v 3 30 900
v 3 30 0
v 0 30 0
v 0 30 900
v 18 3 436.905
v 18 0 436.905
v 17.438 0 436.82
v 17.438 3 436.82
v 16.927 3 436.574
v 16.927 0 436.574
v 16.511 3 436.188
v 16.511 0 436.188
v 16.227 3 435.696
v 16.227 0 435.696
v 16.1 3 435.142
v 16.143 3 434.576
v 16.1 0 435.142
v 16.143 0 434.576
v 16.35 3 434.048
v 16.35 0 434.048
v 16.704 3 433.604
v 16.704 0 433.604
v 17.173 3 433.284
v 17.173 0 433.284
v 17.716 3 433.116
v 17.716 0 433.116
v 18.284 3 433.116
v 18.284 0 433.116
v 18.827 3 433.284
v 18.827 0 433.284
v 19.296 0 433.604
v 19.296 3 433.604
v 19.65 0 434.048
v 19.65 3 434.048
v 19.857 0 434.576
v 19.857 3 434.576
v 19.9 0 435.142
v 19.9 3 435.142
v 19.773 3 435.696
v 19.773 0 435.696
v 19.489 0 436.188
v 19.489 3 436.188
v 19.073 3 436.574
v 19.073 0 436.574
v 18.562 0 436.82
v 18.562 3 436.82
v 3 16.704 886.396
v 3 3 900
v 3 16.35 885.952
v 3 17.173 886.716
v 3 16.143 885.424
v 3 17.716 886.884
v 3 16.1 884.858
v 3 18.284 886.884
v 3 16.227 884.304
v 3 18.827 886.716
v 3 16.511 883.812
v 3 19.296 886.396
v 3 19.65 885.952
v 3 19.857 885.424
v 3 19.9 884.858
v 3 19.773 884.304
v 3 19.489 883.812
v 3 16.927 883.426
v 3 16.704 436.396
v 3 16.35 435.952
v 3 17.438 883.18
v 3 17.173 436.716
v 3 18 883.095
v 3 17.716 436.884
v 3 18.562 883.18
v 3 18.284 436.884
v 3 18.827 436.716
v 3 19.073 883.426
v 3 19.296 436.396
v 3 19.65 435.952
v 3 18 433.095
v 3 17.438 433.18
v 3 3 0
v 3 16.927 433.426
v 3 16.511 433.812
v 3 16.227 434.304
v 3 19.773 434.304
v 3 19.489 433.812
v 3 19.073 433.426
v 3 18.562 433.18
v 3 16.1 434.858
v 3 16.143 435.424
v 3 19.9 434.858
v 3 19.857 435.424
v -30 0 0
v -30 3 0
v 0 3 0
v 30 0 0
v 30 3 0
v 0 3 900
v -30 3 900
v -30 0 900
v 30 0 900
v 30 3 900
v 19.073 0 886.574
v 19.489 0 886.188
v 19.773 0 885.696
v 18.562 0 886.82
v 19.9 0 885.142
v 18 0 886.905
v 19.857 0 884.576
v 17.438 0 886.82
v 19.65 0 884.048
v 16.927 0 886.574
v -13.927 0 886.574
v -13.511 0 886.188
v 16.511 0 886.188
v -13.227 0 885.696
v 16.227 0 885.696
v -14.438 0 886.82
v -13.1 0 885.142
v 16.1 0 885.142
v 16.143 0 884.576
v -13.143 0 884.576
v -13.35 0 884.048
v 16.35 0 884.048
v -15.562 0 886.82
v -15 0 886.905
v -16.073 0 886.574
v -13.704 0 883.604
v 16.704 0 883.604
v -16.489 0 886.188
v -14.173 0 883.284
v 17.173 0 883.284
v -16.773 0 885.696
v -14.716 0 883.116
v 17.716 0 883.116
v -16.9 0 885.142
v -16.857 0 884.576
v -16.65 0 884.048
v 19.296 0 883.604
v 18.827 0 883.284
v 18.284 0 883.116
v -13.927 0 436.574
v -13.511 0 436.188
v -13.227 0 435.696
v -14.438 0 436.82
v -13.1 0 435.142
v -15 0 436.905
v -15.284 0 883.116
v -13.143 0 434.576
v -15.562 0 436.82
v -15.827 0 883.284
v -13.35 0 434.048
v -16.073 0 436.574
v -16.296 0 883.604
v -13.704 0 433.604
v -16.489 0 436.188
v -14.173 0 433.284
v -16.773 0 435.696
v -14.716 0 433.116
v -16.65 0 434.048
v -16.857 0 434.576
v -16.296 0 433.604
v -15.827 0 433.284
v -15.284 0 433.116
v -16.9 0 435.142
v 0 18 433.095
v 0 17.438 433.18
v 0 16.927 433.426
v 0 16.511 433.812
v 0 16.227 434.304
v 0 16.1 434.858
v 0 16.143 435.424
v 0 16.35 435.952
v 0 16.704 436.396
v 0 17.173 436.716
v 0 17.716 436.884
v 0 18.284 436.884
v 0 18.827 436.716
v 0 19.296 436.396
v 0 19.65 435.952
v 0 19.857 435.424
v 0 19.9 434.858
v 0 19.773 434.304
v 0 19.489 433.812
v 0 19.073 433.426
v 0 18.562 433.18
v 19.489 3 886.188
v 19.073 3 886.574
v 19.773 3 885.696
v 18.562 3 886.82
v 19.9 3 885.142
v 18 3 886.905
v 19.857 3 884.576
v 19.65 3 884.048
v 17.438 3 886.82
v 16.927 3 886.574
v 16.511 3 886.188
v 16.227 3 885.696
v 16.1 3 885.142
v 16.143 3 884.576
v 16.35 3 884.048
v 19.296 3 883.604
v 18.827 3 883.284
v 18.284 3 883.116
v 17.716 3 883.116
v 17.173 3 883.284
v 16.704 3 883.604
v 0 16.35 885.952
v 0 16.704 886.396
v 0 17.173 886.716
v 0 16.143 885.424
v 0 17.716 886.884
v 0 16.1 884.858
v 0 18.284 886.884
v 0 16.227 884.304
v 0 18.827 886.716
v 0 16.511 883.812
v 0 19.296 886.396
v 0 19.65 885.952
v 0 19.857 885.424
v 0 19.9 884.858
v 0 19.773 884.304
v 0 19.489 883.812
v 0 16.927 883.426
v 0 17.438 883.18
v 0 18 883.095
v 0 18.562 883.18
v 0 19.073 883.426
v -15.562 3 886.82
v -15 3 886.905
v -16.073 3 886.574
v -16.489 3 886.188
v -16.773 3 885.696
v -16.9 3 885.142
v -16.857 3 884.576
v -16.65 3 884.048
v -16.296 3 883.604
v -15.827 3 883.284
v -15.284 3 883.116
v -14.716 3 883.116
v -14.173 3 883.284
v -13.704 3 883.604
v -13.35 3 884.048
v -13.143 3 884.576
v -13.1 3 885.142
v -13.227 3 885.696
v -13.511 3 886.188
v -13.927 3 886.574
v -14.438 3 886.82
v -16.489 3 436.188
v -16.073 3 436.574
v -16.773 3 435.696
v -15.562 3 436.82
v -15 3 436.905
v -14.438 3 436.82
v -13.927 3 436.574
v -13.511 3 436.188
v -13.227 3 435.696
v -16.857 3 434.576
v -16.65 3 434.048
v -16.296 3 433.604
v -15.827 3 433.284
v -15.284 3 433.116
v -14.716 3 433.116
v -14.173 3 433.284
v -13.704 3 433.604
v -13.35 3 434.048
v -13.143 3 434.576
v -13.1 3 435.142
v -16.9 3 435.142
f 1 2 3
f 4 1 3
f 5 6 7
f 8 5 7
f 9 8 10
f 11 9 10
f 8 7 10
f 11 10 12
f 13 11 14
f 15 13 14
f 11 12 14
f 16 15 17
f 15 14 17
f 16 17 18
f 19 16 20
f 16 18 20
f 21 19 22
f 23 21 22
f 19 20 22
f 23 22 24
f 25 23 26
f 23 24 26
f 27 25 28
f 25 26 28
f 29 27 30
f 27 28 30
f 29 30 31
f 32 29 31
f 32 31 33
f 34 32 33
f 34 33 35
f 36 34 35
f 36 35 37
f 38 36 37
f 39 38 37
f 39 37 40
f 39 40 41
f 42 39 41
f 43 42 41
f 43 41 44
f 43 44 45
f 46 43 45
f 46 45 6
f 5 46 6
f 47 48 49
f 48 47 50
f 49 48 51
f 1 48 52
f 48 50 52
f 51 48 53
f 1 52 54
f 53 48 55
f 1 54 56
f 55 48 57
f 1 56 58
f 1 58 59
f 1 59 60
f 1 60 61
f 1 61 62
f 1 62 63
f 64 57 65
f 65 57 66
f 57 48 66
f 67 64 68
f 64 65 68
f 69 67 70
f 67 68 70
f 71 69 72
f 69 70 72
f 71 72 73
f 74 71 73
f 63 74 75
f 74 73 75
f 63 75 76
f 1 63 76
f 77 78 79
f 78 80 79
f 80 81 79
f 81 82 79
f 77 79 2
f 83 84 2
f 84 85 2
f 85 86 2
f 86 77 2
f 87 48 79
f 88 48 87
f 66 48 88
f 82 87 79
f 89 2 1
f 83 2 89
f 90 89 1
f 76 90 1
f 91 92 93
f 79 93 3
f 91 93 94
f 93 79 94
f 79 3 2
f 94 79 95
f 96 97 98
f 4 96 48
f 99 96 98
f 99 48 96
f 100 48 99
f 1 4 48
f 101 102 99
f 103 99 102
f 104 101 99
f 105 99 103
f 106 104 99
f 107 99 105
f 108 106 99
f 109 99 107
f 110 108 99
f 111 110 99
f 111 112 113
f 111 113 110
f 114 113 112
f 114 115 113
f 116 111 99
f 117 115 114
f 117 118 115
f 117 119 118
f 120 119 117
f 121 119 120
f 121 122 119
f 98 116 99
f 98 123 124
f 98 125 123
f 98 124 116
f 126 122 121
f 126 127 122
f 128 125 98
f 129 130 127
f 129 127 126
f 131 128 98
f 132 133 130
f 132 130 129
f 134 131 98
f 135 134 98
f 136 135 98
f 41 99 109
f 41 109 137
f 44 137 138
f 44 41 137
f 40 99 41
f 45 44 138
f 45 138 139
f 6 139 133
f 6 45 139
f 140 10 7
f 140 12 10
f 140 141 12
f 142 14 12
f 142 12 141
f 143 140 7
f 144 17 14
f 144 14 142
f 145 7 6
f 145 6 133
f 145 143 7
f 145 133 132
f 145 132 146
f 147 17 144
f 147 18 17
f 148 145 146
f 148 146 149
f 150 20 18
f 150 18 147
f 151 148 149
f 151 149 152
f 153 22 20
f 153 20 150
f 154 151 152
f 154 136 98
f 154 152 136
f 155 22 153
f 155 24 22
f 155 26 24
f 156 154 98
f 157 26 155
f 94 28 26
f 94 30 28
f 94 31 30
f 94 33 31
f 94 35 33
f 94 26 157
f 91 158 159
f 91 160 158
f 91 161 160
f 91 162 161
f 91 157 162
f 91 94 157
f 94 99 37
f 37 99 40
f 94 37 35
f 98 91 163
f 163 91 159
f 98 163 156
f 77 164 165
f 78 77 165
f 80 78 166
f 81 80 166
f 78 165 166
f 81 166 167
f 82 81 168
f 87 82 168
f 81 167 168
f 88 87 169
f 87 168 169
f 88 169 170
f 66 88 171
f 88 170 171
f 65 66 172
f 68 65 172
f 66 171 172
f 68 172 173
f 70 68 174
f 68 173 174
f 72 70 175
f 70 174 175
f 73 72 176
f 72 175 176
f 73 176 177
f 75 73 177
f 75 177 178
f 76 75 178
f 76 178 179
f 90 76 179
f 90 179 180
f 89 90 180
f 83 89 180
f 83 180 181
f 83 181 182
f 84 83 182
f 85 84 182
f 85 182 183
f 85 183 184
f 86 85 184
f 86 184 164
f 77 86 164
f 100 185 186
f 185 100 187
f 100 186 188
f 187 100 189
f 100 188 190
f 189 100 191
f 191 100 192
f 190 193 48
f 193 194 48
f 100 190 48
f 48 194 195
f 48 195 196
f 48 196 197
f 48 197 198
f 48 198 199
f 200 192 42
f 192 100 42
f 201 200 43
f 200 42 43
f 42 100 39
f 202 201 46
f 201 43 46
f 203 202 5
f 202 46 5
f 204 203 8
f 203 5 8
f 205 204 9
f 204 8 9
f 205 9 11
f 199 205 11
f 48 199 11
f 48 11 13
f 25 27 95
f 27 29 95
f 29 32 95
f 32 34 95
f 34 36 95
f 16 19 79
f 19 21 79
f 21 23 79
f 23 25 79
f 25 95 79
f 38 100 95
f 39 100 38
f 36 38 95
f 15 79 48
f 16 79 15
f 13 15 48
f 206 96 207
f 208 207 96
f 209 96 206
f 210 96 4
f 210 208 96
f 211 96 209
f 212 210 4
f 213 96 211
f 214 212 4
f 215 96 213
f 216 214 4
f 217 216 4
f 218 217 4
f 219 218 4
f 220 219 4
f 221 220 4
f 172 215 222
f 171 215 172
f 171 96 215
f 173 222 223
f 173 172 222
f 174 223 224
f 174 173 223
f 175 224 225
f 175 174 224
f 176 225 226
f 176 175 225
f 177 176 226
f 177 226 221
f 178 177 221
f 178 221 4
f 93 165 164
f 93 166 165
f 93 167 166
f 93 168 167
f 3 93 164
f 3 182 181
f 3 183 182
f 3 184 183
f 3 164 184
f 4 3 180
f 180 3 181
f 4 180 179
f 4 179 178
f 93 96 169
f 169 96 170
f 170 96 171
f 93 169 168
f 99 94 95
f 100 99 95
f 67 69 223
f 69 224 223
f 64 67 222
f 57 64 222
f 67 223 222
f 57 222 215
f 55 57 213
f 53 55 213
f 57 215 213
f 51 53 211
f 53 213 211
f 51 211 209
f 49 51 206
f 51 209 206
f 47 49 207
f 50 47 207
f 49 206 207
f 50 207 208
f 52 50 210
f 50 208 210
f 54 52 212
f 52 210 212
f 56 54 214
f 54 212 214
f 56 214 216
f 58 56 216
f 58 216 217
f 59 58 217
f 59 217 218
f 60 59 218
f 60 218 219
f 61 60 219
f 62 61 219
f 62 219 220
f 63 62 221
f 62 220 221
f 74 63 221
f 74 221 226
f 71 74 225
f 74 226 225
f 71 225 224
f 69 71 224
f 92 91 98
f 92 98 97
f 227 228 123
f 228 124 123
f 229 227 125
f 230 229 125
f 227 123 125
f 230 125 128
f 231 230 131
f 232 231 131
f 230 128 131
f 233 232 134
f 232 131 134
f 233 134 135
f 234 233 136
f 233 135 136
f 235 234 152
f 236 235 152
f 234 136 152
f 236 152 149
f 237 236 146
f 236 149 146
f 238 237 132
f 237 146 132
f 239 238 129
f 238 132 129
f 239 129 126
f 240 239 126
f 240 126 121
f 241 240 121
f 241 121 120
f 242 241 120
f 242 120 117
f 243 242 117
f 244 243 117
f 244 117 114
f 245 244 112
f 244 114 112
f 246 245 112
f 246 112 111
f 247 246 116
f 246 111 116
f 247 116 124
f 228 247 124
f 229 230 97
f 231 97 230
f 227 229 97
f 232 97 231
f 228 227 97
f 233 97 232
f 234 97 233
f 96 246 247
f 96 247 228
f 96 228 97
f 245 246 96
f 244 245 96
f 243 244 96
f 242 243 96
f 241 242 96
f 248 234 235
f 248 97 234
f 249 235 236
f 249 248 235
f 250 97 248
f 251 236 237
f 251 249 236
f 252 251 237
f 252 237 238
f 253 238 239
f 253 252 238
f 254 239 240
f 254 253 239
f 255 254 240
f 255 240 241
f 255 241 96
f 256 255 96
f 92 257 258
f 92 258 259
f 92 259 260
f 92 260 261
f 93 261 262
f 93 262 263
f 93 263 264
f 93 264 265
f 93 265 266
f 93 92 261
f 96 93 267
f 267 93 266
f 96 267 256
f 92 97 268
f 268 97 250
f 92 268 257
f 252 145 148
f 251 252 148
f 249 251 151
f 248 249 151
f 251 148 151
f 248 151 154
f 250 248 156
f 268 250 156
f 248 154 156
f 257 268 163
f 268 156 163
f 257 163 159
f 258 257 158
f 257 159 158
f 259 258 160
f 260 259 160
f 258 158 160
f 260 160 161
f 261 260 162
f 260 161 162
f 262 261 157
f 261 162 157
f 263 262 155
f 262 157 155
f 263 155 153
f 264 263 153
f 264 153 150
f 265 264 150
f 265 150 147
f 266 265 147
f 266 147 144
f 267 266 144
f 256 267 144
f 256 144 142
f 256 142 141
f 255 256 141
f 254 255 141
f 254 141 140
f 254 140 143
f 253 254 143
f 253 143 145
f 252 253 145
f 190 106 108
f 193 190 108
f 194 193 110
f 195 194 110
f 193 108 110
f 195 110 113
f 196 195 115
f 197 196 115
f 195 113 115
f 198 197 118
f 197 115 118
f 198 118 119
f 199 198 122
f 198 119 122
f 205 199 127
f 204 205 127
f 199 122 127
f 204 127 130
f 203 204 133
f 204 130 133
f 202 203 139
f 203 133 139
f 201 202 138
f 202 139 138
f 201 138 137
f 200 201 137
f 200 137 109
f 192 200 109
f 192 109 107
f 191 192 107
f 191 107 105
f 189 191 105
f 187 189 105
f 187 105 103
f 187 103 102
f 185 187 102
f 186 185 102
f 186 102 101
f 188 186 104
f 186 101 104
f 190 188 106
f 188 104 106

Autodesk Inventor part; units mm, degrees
ref_plane "YZ Plane" through (0, 0, 0) normal (1, 0, 0) x (0, 1, 0)
ref_plane "XZ Plane" through (0, 0, 0) normal (0, 1, 0) x (-1, 0, 0)
ref_plane "XY Plane" through (0, 0, 0) normal (0, 0, 1) x (1, 0, 0)
sketch "Sketch1" plane through (0, 0, 0) normal (0, 0, 1) x (1, 0, 0)
  line L0 (0, 0) -> (30, 0)
  line L1 (30, 0) -> (30, 3)
  line L2 (30, 3) -> (3, 3)
  line L3 (3, 3) -> (3, 30)
  line L4 (3, 30) -> (0, 30)
  line L5 (0, 0) -> (-30, 0)
  line L6 (-30, 0) -> (-30, 3)
  line L7 (-30, 3) -> (0, 3)
  line L8 (0, 3) -> (0, 30)
  dimension "d0" = 3
  dimension "d2" = 30
  dimension "d5" = 3
extrude "Extrusion1" add sketch "Sketch1" along normal blind 900
sketch "Sketch2" plane through (3, 3, 900) normal (0, 1, 0) x (1, 0, 0)
  line L0 (-3, 0) -> (-33, 0) projected
  line L1 (-3, 900) -> (-3, 0) projected
  line L2 (0, 900) -> (0, 0) projected
  line L3 (27, 0) -> (0, 0) projected
  point P0 (15, 15)
  point P1 (-18, 15)
  point P2 (-18, 465)
  point P3 (15, 465)
  point P4 (15, 915)
  point P5 (-18, 915)
  point P6 (-18, 1365)
  point P7 (15, 1365)
  dimension "d8" = 15
  dimension "d9" = 15
  dimension "d10" = 15
  dimension "d11" = 15
  dimension "d12" = 450
  dimension "d13" = 450
  dimension "d14" = 15
  dimension "d15" = 15
  dimension "d16" = 450
  dimension "d17" = 450
  dimension "d18" = 15
  dimension "d19" = 15
  dimension "d20" = 450
  dimension "d21" = 450
  dimension "d22" = 15
  dimension "d23" = 15
hole "Hole1" at (18, 3, 885) at (-15, 3, 885) at (-15, 3, 435) at (18, 3, 435) at (18, 3, -15) at (-15, 3, -15) at (-15, 3, -465) at (18, 3, -465) direction (0, -1, 0) diameter 3.81 end through all
sketch "Sketch3" plane through (3, 30, 900) normal (1, 0, 0) x (0, 0, -1)
  line L0 (0, -27) -> (0, 0) projected
  line L1 (900, -27) -> (0, -27) projected
  point P0 (900, -30)
  point P1 (15, -12)
  point P2 (465, -12)
  point P3 (915, -12)
  point P4 (1365, -12)
  dimension "d31" = 15
  dimension "d32" = 15
  dimension "d33" = 450
  dimension "d34" = 15
  dimension "d35" = 450
  dimension "d36" = 450
  dimension "d37" = 15
  dimension "d38" = 15
hole "Hole2" at (3, 18, 885) at (3, 18, 435) at (3, 18, -15) at (3, 18, -465) direction (-1, 0, 0) diameter 3.81 end through all
equation "\"d0\" = Thickness"
equation "\"d2\" = Width"
equation "\"d5\" = Thickness"
equation "\"d6\" = Height"
equation "\"d8\" = HoleDistance"
equation "\"d9\" = HoleDistance"
equation "\"d10\" = HoleDistance"
equation "\"d11\" = HoleDistance"
equation "\"d14\" = HoleDistance"
equation "\"d15\" = HoleDistance"
equation "\"d18\" = HoleDistance"
equation "\"d19\" = HoleDistance"
equation "\"d22\" = HoleDistance"
equation "\"d23\" = HoleDistance"
equation "\"d31\" = HoleDistance"
equation "\"d32\" = HoleDistance"
equation "\"d34\" = HoleDistance"
equation "\"d37\" = HoleDistance"
equation "\"d38\" = HoleDistance"
equation "\"Width\" = 30"
equation "\"Thickness\" = 3"
equation "\"Height\" = 900"
equation "\"HoleDistance\" = 15"
properties part number "mid90"
